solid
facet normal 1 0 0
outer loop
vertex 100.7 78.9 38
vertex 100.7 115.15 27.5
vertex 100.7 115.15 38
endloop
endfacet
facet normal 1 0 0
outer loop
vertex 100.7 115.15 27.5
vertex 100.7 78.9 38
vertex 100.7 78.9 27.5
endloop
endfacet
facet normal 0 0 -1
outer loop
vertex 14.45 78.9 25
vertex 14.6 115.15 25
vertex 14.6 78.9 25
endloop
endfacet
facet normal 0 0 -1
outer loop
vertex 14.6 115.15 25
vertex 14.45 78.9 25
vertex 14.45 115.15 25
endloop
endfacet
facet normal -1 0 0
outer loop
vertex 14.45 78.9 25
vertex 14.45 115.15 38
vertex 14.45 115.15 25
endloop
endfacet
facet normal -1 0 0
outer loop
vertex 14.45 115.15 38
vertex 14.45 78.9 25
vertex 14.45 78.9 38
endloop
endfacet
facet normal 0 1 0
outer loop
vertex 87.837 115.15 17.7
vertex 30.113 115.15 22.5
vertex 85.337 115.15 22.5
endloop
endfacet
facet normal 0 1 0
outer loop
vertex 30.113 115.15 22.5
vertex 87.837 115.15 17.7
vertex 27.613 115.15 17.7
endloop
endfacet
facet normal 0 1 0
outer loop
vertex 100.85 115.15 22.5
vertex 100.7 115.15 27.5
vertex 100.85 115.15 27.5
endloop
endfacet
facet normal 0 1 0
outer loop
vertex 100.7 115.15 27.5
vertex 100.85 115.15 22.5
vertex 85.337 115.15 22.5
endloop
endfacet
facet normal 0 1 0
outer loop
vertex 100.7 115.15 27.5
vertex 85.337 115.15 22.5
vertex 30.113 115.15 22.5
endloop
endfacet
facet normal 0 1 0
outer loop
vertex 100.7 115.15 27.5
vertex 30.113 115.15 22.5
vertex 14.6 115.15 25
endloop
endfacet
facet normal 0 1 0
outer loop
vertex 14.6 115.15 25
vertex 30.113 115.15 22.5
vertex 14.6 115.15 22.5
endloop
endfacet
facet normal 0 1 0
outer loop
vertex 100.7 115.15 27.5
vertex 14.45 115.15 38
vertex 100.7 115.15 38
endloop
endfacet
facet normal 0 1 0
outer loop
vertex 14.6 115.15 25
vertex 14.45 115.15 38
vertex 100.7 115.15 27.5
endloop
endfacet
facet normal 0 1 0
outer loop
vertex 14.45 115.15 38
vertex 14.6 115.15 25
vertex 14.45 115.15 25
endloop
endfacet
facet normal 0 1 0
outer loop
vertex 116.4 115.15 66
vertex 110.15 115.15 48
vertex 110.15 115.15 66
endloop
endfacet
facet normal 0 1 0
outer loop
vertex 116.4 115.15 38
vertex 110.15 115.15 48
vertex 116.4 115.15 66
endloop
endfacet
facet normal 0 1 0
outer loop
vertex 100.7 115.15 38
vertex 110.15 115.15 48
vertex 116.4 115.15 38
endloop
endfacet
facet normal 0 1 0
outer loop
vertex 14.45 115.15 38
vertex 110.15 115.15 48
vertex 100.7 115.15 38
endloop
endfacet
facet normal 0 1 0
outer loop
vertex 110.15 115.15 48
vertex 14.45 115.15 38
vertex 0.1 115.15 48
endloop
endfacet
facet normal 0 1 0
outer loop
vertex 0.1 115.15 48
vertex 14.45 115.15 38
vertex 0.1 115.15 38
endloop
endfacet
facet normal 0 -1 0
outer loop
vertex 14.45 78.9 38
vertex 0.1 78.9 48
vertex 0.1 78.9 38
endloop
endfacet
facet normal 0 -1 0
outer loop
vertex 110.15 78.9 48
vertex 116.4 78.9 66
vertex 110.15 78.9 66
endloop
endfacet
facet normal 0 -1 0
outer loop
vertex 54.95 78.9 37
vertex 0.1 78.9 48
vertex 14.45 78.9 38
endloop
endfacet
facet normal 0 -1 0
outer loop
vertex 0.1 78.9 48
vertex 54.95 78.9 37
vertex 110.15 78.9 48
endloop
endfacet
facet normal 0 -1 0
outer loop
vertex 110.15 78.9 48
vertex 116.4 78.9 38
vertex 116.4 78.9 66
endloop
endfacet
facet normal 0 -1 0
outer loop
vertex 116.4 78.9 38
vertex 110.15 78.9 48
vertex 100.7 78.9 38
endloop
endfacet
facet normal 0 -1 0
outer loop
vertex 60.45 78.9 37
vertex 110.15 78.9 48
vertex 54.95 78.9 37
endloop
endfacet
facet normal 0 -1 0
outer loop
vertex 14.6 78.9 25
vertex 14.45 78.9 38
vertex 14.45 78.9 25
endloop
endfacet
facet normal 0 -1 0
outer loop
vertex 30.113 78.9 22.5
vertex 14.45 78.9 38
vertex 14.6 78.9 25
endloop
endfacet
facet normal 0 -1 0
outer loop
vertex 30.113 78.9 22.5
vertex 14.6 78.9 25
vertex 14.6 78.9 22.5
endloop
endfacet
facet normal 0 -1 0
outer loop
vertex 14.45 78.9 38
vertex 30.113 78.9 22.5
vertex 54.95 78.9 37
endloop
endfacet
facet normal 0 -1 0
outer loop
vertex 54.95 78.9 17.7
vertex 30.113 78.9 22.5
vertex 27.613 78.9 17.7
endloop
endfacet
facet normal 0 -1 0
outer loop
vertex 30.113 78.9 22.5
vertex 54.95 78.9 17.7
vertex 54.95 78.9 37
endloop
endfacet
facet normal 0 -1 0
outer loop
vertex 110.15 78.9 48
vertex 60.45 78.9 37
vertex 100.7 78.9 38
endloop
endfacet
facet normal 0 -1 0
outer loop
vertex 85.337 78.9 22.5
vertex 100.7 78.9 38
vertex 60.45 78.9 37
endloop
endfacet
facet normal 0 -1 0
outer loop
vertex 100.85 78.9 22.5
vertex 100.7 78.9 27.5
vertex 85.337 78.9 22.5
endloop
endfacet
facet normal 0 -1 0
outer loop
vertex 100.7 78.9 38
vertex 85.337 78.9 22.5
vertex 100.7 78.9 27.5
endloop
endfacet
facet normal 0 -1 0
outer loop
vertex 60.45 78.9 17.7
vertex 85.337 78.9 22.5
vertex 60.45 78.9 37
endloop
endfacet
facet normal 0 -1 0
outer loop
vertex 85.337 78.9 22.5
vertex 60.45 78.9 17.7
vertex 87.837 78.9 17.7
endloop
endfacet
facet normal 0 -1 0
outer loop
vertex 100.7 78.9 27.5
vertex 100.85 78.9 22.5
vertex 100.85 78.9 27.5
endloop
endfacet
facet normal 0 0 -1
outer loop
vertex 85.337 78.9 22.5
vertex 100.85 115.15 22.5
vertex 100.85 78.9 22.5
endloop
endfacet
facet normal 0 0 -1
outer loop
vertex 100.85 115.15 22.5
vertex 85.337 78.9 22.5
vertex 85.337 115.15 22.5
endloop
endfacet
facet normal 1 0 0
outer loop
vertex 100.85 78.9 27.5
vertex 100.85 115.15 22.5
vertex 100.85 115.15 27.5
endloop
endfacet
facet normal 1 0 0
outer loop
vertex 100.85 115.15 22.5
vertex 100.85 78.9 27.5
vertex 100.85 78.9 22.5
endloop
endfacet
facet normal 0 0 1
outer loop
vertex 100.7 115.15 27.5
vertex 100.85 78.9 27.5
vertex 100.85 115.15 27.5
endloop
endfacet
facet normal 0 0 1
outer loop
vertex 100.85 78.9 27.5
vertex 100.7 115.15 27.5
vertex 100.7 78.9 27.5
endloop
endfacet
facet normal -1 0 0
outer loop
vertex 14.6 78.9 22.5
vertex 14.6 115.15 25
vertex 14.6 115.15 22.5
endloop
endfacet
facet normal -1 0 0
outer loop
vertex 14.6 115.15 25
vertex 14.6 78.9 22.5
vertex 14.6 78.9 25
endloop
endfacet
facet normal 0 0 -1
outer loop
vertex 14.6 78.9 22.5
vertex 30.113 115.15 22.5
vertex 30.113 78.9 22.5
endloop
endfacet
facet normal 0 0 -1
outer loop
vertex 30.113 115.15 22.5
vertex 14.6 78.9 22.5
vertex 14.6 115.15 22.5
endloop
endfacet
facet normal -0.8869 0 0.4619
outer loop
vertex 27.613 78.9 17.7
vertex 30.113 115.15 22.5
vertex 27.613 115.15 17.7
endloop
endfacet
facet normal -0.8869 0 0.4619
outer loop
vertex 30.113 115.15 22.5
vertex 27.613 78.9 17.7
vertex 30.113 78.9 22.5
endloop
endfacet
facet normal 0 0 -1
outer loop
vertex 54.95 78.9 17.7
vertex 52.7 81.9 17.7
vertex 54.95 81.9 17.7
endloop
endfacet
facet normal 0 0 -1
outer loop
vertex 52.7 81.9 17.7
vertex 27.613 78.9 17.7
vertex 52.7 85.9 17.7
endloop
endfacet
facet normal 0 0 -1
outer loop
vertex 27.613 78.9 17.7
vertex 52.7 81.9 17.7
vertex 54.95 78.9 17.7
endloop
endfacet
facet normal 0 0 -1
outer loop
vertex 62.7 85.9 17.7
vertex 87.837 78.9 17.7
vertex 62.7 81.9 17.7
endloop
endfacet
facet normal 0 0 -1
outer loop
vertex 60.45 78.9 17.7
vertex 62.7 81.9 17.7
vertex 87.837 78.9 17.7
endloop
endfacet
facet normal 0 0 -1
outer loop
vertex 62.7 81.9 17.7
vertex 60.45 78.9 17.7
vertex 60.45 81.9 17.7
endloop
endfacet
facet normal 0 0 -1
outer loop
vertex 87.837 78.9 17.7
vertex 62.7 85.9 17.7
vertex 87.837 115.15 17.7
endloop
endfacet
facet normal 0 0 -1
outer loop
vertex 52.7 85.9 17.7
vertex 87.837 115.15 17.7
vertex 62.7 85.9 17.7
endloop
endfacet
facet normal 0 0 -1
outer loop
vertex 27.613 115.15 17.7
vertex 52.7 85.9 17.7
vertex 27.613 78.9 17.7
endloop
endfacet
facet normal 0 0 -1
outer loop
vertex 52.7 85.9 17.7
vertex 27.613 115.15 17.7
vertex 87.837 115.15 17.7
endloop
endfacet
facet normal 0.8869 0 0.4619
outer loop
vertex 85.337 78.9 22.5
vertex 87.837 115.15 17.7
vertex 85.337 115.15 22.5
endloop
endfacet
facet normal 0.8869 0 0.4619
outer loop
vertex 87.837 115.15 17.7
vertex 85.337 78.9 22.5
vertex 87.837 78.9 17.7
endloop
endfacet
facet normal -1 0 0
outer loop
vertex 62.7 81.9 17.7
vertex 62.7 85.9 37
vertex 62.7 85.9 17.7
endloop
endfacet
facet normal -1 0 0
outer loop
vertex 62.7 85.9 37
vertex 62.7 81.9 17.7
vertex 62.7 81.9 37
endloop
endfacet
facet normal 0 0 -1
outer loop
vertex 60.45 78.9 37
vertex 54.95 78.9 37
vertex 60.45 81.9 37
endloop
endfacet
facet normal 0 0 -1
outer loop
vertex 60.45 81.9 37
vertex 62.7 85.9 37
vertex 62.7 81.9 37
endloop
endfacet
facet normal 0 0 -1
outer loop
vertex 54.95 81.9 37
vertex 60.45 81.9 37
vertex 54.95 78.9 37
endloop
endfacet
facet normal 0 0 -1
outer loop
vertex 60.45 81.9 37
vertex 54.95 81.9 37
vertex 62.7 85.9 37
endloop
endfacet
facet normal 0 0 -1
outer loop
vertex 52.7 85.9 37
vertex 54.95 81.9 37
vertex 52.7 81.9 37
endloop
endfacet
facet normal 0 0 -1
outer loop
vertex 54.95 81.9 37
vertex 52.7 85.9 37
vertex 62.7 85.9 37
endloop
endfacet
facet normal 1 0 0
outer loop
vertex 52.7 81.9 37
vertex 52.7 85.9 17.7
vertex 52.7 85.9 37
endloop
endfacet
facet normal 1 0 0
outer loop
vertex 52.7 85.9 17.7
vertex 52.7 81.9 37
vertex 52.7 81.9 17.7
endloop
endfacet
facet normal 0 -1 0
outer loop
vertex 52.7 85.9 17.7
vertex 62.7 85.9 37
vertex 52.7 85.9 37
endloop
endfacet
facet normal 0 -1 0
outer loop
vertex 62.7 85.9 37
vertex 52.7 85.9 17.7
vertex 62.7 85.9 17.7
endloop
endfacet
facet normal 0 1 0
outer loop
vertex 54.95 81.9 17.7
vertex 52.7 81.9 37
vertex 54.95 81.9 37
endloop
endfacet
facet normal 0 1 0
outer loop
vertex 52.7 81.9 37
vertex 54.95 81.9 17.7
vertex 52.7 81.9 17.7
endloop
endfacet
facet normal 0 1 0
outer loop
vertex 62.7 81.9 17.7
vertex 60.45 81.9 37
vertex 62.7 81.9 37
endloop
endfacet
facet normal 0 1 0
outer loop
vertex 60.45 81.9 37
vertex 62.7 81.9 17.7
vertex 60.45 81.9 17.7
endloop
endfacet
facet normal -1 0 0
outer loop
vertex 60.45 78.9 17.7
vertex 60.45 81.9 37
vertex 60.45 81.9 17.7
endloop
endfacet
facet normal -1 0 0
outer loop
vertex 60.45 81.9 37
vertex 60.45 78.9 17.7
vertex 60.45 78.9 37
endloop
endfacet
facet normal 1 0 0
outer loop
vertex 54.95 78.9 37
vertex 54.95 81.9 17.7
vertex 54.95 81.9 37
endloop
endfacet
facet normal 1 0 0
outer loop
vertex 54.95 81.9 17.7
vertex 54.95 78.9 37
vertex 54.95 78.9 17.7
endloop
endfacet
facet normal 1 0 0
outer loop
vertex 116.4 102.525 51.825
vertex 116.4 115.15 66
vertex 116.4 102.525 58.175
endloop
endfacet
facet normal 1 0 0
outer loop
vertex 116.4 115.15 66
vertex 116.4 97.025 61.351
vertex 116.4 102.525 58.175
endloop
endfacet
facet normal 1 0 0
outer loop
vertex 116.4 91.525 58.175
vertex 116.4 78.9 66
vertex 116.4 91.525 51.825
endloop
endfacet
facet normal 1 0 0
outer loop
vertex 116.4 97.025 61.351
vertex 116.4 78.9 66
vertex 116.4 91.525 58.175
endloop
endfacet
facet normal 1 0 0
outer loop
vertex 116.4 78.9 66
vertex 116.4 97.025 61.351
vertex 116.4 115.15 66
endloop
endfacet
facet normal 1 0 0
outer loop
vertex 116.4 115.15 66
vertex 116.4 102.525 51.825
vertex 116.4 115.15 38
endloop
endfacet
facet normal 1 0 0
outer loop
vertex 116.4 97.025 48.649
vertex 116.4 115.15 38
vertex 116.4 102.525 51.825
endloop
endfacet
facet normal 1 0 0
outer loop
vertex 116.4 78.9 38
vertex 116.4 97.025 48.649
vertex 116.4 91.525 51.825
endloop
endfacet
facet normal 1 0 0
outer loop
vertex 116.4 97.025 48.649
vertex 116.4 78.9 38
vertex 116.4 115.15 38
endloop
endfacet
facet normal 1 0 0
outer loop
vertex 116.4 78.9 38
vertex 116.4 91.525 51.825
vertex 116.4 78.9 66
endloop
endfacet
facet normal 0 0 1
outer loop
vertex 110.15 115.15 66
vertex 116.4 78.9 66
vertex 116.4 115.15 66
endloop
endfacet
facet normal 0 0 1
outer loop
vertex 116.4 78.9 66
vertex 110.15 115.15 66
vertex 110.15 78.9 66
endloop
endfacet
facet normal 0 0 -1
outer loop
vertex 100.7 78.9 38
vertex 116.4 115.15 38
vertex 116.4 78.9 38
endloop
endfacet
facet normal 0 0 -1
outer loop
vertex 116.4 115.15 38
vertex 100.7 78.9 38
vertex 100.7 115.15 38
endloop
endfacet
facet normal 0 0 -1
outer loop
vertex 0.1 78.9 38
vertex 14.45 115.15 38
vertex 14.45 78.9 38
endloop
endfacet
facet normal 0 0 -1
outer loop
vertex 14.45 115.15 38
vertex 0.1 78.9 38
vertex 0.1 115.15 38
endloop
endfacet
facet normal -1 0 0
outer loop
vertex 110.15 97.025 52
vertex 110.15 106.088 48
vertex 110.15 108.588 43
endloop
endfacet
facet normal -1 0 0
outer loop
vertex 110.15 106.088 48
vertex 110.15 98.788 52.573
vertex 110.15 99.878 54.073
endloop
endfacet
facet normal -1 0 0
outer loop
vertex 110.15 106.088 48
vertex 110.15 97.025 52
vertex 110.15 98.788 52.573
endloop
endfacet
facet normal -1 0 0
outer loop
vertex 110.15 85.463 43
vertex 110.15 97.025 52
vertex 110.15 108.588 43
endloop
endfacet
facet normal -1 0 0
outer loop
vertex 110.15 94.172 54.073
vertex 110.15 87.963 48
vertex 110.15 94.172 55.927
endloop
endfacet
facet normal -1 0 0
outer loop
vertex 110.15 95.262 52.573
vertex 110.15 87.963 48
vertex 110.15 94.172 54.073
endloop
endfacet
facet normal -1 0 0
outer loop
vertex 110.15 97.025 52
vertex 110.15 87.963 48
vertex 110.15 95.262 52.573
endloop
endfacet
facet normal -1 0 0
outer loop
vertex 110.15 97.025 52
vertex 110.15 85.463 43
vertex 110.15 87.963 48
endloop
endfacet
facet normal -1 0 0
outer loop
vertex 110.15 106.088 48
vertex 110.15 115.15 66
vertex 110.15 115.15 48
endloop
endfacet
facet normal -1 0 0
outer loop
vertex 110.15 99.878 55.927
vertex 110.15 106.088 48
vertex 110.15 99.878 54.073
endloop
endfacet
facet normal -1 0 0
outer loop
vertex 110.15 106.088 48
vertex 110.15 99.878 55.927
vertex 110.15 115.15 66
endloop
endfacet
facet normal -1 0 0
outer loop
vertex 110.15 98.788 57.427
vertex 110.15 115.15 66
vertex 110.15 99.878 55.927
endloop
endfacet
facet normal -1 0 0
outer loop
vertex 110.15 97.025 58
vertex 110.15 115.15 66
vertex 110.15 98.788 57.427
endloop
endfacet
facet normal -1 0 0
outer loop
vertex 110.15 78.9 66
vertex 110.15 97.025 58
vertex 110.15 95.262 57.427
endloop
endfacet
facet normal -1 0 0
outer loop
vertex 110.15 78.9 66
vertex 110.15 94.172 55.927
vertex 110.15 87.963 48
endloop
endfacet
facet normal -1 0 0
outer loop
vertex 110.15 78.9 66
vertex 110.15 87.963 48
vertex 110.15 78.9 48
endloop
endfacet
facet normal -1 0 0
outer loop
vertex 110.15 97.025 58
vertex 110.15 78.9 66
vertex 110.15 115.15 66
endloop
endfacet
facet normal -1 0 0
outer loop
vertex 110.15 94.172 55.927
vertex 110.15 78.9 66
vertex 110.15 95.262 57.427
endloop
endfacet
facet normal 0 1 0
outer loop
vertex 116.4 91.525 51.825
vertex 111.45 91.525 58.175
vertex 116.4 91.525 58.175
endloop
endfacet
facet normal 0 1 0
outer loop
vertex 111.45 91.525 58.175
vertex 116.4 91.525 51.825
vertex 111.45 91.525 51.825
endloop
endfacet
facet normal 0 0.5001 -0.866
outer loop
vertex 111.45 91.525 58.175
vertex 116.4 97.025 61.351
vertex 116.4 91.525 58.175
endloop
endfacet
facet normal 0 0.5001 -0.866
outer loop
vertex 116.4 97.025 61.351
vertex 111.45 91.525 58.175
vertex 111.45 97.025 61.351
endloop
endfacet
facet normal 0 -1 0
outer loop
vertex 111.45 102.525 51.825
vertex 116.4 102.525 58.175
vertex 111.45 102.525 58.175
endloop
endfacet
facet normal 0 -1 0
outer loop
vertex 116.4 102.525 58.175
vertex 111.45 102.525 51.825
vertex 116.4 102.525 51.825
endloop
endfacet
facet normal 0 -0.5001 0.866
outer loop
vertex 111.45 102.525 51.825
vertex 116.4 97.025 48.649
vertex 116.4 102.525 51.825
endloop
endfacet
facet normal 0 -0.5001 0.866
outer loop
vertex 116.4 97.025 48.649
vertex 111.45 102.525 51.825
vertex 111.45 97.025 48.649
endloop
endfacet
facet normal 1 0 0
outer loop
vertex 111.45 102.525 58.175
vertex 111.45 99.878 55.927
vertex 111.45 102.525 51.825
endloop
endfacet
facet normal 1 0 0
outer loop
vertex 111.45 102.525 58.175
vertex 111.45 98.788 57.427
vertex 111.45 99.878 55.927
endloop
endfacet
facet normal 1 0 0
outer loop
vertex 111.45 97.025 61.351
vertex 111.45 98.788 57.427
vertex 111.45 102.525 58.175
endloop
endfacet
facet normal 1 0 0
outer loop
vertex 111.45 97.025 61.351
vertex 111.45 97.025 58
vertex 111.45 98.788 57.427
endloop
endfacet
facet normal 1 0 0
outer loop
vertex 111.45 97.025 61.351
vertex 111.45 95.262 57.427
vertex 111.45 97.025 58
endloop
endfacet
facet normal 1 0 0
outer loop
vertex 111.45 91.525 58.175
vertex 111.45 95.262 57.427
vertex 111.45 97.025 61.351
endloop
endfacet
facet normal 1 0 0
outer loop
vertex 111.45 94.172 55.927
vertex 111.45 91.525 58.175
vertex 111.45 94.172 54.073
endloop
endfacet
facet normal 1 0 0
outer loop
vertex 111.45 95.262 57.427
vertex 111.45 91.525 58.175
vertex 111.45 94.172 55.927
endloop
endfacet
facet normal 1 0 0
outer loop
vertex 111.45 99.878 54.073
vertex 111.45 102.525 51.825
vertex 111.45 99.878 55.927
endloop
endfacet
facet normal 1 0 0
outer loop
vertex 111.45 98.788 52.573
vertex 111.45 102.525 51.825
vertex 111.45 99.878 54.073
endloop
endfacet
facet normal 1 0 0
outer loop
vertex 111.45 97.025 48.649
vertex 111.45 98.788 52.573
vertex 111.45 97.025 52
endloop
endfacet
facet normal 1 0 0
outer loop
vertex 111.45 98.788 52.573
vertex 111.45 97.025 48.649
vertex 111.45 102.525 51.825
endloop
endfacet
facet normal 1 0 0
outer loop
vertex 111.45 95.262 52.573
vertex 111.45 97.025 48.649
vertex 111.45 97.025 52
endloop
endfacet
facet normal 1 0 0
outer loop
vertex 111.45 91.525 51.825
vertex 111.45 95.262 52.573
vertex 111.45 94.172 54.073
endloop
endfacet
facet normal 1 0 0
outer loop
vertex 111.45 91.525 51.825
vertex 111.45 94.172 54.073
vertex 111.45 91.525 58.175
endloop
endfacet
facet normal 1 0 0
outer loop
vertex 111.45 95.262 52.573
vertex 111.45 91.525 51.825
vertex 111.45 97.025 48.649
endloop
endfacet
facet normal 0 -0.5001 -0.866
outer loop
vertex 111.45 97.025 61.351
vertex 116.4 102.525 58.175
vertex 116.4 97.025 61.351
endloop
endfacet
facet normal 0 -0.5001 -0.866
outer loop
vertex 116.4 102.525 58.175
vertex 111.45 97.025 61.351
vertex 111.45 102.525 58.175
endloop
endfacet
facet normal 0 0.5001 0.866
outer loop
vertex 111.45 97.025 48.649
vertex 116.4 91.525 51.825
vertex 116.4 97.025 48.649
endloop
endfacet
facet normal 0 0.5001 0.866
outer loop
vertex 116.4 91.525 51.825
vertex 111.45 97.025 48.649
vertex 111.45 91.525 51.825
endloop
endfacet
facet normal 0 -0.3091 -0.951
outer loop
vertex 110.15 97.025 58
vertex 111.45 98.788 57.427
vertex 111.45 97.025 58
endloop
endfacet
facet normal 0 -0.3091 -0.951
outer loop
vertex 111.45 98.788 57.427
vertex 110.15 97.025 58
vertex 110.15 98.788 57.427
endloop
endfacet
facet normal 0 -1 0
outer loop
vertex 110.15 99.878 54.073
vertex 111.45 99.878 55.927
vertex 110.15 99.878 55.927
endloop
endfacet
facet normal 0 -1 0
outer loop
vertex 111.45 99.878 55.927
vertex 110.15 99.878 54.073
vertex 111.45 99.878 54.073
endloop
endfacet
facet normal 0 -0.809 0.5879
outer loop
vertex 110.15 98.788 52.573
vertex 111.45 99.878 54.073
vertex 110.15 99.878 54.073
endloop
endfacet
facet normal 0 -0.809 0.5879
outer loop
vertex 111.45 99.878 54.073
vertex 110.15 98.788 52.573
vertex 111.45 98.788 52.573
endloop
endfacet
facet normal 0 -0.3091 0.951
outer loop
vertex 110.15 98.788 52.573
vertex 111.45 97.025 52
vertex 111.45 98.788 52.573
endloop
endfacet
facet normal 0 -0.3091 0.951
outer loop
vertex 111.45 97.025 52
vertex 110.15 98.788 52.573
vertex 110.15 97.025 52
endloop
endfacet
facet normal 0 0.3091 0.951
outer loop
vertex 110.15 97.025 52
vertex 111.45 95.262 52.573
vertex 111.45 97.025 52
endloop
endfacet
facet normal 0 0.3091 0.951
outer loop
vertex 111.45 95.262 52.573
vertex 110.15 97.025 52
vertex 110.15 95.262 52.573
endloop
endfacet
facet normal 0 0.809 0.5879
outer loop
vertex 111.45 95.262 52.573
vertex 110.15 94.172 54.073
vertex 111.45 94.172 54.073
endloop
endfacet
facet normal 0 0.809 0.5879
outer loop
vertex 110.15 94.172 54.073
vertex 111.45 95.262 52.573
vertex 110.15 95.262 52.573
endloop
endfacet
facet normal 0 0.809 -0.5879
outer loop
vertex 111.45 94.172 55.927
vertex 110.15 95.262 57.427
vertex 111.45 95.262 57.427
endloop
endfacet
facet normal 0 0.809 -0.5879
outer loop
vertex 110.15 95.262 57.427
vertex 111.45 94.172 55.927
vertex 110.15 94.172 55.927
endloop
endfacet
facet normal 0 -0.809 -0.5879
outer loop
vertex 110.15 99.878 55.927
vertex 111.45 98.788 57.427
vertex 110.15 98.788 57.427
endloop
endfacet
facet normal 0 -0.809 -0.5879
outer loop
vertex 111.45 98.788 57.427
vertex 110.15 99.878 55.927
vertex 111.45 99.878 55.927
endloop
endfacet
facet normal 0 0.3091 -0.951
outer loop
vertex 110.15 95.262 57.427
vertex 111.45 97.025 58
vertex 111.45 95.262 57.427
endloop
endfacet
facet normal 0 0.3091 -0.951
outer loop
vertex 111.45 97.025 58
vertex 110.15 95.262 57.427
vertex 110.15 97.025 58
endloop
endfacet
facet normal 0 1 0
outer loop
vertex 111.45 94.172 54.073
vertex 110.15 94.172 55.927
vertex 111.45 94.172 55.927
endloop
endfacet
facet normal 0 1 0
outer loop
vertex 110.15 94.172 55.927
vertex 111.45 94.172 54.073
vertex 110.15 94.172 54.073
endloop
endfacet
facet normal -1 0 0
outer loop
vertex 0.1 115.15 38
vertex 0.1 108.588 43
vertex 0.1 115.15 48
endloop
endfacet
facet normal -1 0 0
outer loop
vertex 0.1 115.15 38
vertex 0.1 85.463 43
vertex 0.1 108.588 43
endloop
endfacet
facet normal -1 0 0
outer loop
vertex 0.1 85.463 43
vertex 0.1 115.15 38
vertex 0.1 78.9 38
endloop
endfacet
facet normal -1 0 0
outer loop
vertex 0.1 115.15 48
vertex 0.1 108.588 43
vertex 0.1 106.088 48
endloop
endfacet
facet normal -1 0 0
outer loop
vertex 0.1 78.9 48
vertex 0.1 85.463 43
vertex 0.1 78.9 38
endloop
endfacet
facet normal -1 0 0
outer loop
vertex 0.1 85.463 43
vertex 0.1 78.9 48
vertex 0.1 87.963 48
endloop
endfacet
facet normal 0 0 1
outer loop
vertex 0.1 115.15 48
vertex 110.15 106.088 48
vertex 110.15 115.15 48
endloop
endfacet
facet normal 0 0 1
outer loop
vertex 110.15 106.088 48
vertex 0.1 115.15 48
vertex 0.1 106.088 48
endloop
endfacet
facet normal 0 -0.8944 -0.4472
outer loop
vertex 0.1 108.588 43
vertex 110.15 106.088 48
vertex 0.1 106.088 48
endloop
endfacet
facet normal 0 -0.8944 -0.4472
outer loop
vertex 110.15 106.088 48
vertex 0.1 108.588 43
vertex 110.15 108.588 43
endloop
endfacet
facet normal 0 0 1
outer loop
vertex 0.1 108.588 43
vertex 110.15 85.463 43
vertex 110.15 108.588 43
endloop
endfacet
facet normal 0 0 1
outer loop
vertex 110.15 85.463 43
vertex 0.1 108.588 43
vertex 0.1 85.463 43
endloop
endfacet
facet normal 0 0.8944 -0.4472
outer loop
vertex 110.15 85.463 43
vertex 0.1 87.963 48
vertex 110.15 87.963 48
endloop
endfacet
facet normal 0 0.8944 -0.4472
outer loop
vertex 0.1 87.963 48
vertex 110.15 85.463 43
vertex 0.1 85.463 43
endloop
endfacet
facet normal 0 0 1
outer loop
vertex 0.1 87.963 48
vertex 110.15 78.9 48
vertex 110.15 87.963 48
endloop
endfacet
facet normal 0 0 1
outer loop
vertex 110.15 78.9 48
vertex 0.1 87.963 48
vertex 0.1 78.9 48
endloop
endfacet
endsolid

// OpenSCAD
//-----Rabo de Andorinha Cima (Eixo Y) / Rabo de Andorinha Baixo (Eixo X)-----//

//-----Declaração de Variáveis-----//
r=3;
d=25;
h=9;
nx=5;
ny=5;
geo=1;
res=10;
aux=2*d+15.15;
aux2=40.7-24.2+111.70-16.7-5.15/2;
aux3=11/2;
aux4=(37.55+4)/2 - (16.35+5.1/2-13.2);
cc=25;
ff=37.5;
gg=0.2;
shift=(17.5+2*d)/2;
shift2=(17.5)/2;
h_alt=11/2;
hip=h_alt/(sin(60));
o_ext=d*0.75+2*shift; // Segundo rabo de andorinha
o_ext2=2*shift2+d*0.75; //Primeiro rabo de andorinha

//-----Declaração de Funções-----//
module funcao_2d_array_cilindros(r,d,h,nx,ny,geo,res){
    //-----FUNÇÃO ARRAY 2D DE CILÍNDROS-----//
    /*
    Forneça:
        raio dos cilíndros: r
        distância entre os centros de cada cilíndro: d
        altura dos cilíndros: h
        quantidade de cilíndros em ambas as direções: nx, ny
        resolução dos cilíndros: res
    Selecione a geometria:
         Retangular: 1
         Hexagonal: 2
    
    Quantidade de cilíndros = nx*ny
    geo=1 => Dimensões: [(nx-1)*d+2*r,(ny-1)*d+2*r,h]
    geo=2 => Dimensões: [(nx-1+cos(60))*d+2*r,(ny-1)*d*sin(60)+2*r,h]
    */
    if (d<2*r){
        text("Error!");
        translate([0,-15,0])text("Verify your specified dimensions.");
    }else{
        if(geo==1){
            for(j=[0:1:ny-1]){
                for(i=[0:1:nx-1]){
                    translate([i*d,j*d,0])cylinder(h,r,r,$fn=res);
                }
            }
        }else if(geo==2){
            for(j=[0:1:ny-1]){
                for(i=[0:1:nx-1]){
                    translate([i*d+(j%2)*d*cos(60),j*d*sin(60),0])cylinder(h,r,r,$fn=res);
                }
            }
        }else{
            text("Error!");
            translate([0,-15,0])text("Please, choose a valid geometry number.");
        }
        
    }    
}

//-----Rabo de Andorinha Eixo Y-----//
//-----Translação no Eixo X (d mm)-----//
translate([d,0,0]){
    //-----Rabo de Andorinha Cima (Eixo Y)-----//
    difference(){
        translate([0,0,0]){
            translate([aux/2-shift-(d*0.75)/2,4*d+5.15+10-o_ext2,25])cube([o_ext,2*shift2+d*0.75,42-25]);
            translate([7.725,4*d+5.15+10,-17.5])rotate([90,0,0])linear_extrude(o_ext2)polygon(points=[[35+shift-(20-(d*0.75))/2,45],[35+shift-(20-(d*0.75))/2,40],[27.5-        gg+shift*0.75,40],[30-gg+shift*0.75,35+gg],[20+gg-shift*0.75,35+gg],[22.5+gg-shift*0.75,40],[15-shift+(20-(d*0.75))/2,40],[15-shift+(20-(d*0.75))/2,45]]);
        }
        #translate([-17.3,0,0])translate([50-5,4*d+5.15+10-o_ext2+3,0])cube([10,4,37]);
        #translate([-17.3,0,0])translate([50-5.5/2,4*d+5.15+10-o_ext2,0])cube([5.5,4,37]);
    }
};

//-----Rabo de Andorinha (Eixo X)-----//
difference(){
    translate([-(aux/2-shift-(d*0.75)/2)+4-(4*d+5.15+10-o_ext)/2,4*d+5.15+10-o_ext2,0])
    translate([0,0,38])
    rotate([0,0,90])
    rotate([90,0,0]) // Muitas translações e rotações
    {   
        //-----Rabo de Andorinha Baixo (Eixo X)-----// 
        translate([-(15-shift2+(20-(d*0.75))/2),-30,0])linear_extrude(4*d+5.15+10)polygon(points=[[15-shift2+(20-(d*0.75))/2,30],[        35+shift2-(20-(d*0.75))/2,30],[35+        shift2-(20-(d*0.75))/2,40],[27.5+shift2*0.75,40],[30+shift2*0.75,35],[20-shift2*        0.75,35],[22.5-shift2*0.75,40],[15-shift2+(20-(d*0.75))/2,40]]);
    };
};

//-----Fuso/Rosca do Rabo de Andorinha (Eixo X)-----//
difference(){
    translate([4*d+0.15+10,4*d+5.15+10-o_ext2,38])cube([d*0.25,o_ext2,28]);
    #translate([4*d+5.15+10+1.3,4*d+5.15+10-o_ext2/2,38+12+5])rotate([0,-90,0])cylinder(5,hip,hip,$fn=6);
    #translate([4*d+5.15+10+1.3,4*d+5.15+10-o_ext2/2,38+12+5])rotate([0,-90,0])cylinder(d*0.75,r,r,$fn=res);
};
